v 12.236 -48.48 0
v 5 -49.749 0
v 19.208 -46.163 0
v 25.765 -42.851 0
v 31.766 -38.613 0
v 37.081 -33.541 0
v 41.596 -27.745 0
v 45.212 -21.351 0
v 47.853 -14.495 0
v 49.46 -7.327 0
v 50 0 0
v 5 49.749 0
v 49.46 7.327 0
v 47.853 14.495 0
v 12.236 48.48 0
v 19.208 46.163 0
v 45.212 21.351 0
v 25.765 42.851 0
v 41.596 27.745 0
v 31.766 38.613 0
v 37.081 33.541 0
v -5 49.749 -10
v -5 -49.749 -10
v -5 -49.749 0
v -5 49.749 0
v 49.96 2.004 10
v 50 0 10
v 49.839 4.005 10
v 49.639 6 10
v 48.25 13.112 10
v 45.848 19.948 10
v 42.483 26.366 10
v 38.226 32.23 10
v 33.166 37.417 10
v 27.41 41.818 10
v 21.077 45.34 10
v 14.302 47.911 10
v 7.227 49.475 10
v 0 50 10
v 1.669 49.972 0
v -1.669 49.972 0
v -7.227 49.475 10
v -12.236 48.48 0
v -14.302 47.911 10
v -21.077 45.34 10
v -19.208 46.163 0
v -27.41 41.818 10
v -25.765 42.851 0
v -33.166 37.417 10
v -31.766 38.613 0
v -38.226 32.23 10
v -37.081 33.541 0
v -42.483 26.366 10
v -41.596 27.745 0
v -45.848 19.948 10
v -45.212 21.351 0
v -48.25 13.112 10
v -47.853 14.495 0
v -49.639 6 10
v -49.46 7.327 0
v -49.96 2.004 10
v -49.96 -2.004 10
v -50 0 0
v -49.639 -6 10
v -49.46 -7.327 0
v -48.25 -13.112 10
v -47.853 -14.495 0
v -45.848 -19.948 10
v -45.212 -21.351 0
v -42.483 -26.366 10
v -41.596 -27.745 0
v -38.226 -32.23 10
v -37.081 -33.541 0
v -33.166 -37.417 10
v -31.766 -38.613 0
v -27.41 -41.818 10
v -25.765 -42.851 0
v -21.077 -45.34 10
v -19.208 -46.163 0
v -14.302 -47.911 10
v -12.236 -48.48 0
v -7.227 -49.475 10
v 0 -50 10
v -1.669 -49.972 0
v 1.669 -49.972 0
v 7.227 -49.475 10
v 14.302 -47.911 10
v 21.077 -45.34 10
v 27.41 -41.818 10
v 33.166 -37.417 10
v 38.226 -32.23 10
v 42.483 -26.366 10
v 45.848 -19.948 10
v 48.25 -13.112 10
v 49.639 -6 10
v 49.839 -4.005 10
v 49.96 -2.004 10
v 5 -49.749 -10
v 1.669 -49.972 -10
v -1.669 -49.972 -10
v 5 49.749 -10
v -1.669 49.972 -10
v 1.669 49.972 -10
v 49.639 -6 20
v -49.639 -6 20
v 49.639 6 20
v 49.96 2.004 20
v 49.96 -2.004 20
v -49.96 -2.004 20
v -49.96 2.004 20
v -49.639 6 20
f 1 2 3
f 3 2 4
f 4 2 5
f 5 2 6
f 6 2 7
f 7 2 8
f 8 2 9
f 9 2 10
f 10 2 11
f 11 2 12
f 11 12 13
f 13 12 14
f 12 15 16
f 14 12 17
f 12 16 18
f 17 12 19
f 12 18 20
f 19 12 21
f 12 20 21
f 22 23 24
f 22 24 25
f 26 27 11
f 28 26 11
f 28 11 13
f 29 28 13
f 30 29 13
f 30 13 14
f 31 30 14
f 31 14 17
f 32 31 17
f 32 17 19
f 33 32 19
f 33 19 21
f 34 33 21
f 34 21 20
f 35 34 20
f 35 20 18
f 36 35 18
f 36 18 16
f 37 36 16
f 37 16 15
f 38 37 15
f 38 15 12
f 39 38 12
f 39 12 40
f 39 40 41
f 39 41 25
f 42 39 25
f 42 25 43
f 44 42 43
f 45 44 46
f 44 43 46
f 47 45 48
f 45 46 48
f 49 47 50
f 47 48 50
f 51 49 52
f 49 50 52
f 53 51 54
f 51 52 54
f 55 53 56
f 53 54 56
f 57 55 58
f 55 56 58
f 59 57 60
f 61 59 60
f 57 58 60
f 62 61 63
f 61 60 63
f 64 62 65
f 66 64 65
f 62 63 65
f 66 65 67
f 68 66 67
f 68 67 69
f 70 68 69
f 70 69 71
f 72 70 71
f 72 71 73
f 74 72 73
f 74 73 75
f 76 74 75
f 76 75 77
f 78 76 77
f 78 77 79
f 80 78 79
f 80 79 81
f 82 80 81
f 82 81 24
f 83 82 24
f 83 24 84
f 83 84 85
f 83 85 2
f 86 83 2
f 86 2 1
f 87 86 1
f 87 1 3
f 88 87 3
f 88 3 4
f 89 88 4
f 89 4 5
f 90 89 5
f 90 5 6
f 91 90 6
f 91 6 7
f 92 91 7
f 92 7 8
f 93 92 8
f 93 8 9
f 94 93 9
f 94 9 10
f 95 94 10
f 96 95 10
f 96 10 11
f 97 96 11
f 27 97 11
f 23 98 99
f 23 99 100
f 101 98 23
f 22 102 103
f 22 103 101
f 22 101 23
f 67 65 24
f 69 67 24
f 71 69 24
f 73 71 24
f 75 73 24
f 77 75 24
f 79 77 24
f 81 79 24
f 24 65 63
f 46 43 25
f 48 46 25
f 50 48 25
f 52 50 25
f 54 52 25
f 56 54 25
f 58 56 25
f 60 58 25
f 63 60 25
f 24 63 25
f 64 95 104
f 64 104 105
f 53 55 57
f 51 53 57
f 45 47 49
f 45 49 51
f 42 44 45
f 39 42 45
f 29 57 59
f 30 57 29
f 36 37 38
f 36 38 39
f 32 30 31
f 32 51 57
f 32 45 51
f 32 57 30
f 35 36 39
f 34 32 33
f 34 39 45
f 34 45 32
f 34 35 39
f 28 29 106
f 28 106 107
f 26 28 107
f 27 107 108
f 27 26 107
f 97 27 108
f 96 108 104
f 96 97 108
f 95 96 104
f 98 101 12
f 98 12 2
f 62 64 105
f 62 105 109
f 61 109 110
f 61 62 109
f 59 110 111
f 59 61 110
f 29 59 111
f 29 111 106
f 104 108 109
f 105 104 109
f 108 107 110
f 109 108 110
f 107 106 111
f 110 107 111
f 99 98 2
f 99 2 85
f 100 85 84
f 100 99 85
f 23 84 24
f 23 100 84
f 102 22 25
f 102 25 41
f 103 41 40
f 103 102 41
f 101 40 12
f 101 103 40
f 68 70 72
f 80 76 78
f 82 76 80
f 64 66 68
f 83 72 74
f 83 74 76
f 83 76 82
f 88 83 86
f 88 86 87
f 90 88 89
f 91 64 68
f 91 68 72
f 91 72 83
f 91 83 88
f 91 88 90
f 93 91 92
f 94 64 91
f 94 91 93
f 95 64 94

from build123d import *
from build123d.topology import SkipClean

# Parameters (mm, degrees)
SKETCH1_R           = 50
BOSS_EXTRUDE1_DEPTH = 10
BOSS_EXTRUDE2_DEPTH = 10
BOSS_EXTRUDE3_START = 10
BOSS_EXTRUDE3_DEPTH = 10


with BuildPart() as part:
    # Sketch1 → Boss-Extrude1 (new body)
    with BuildSketch(Plane.XY):
        Circle(SKETCH1_R)
    extrude(amount=BOSS_EXTRUDE1_DEPTH)

    # Sketch2 → Boss-Extrude2 (add)
    with SkipClean():  # the faces are left unmerged after this step: merging them gives an invalid solid
        with BuildSketch(Plane.XY.offset(10)):
            with BuildLine():
                Line((-49.638694584, 6), (49.638694584, 6))
                ThreePointArc((49.638694584, 6), (50, 0), (49.638694584, -6))
                Line((49.638694584, -6), (-49.638694584, -6))
                ThreePointArc((-49.638694584, -6), (-50, 0), (-49.638694584, 6))
            make_face()
        extrude(amount=BOSS_EXTRUDE2_DEPTH)

    # Sketch3 → Boss-Extrude3 (add)
    with SkipClean():  # the faces are left unmerged after this step: merging them gives an invalid solid
        with BuildSketch(Plane(origin=(0, 0, 0), x_dir=(-1, 0, 0), z_dir=(0, 0, -1)).offset(BOSS_EXTRUDE3_START)):
            with BuildLine():
                Line((-5, 49.749371855), (-5, -49.749371855))
                ThreePointArc((-5, -49.749371855), (0, -50), (5, -49.749371855))
                Line((5, -49.749371855), (5, 49.749371855))
                ThreePointArc((5, 49.749371855), (0, 50), (-5, 49.749371855))
            make_face()
        extrude(amount=-BOSS_EXTRUDE3_DEPTH)


solid = part.part
